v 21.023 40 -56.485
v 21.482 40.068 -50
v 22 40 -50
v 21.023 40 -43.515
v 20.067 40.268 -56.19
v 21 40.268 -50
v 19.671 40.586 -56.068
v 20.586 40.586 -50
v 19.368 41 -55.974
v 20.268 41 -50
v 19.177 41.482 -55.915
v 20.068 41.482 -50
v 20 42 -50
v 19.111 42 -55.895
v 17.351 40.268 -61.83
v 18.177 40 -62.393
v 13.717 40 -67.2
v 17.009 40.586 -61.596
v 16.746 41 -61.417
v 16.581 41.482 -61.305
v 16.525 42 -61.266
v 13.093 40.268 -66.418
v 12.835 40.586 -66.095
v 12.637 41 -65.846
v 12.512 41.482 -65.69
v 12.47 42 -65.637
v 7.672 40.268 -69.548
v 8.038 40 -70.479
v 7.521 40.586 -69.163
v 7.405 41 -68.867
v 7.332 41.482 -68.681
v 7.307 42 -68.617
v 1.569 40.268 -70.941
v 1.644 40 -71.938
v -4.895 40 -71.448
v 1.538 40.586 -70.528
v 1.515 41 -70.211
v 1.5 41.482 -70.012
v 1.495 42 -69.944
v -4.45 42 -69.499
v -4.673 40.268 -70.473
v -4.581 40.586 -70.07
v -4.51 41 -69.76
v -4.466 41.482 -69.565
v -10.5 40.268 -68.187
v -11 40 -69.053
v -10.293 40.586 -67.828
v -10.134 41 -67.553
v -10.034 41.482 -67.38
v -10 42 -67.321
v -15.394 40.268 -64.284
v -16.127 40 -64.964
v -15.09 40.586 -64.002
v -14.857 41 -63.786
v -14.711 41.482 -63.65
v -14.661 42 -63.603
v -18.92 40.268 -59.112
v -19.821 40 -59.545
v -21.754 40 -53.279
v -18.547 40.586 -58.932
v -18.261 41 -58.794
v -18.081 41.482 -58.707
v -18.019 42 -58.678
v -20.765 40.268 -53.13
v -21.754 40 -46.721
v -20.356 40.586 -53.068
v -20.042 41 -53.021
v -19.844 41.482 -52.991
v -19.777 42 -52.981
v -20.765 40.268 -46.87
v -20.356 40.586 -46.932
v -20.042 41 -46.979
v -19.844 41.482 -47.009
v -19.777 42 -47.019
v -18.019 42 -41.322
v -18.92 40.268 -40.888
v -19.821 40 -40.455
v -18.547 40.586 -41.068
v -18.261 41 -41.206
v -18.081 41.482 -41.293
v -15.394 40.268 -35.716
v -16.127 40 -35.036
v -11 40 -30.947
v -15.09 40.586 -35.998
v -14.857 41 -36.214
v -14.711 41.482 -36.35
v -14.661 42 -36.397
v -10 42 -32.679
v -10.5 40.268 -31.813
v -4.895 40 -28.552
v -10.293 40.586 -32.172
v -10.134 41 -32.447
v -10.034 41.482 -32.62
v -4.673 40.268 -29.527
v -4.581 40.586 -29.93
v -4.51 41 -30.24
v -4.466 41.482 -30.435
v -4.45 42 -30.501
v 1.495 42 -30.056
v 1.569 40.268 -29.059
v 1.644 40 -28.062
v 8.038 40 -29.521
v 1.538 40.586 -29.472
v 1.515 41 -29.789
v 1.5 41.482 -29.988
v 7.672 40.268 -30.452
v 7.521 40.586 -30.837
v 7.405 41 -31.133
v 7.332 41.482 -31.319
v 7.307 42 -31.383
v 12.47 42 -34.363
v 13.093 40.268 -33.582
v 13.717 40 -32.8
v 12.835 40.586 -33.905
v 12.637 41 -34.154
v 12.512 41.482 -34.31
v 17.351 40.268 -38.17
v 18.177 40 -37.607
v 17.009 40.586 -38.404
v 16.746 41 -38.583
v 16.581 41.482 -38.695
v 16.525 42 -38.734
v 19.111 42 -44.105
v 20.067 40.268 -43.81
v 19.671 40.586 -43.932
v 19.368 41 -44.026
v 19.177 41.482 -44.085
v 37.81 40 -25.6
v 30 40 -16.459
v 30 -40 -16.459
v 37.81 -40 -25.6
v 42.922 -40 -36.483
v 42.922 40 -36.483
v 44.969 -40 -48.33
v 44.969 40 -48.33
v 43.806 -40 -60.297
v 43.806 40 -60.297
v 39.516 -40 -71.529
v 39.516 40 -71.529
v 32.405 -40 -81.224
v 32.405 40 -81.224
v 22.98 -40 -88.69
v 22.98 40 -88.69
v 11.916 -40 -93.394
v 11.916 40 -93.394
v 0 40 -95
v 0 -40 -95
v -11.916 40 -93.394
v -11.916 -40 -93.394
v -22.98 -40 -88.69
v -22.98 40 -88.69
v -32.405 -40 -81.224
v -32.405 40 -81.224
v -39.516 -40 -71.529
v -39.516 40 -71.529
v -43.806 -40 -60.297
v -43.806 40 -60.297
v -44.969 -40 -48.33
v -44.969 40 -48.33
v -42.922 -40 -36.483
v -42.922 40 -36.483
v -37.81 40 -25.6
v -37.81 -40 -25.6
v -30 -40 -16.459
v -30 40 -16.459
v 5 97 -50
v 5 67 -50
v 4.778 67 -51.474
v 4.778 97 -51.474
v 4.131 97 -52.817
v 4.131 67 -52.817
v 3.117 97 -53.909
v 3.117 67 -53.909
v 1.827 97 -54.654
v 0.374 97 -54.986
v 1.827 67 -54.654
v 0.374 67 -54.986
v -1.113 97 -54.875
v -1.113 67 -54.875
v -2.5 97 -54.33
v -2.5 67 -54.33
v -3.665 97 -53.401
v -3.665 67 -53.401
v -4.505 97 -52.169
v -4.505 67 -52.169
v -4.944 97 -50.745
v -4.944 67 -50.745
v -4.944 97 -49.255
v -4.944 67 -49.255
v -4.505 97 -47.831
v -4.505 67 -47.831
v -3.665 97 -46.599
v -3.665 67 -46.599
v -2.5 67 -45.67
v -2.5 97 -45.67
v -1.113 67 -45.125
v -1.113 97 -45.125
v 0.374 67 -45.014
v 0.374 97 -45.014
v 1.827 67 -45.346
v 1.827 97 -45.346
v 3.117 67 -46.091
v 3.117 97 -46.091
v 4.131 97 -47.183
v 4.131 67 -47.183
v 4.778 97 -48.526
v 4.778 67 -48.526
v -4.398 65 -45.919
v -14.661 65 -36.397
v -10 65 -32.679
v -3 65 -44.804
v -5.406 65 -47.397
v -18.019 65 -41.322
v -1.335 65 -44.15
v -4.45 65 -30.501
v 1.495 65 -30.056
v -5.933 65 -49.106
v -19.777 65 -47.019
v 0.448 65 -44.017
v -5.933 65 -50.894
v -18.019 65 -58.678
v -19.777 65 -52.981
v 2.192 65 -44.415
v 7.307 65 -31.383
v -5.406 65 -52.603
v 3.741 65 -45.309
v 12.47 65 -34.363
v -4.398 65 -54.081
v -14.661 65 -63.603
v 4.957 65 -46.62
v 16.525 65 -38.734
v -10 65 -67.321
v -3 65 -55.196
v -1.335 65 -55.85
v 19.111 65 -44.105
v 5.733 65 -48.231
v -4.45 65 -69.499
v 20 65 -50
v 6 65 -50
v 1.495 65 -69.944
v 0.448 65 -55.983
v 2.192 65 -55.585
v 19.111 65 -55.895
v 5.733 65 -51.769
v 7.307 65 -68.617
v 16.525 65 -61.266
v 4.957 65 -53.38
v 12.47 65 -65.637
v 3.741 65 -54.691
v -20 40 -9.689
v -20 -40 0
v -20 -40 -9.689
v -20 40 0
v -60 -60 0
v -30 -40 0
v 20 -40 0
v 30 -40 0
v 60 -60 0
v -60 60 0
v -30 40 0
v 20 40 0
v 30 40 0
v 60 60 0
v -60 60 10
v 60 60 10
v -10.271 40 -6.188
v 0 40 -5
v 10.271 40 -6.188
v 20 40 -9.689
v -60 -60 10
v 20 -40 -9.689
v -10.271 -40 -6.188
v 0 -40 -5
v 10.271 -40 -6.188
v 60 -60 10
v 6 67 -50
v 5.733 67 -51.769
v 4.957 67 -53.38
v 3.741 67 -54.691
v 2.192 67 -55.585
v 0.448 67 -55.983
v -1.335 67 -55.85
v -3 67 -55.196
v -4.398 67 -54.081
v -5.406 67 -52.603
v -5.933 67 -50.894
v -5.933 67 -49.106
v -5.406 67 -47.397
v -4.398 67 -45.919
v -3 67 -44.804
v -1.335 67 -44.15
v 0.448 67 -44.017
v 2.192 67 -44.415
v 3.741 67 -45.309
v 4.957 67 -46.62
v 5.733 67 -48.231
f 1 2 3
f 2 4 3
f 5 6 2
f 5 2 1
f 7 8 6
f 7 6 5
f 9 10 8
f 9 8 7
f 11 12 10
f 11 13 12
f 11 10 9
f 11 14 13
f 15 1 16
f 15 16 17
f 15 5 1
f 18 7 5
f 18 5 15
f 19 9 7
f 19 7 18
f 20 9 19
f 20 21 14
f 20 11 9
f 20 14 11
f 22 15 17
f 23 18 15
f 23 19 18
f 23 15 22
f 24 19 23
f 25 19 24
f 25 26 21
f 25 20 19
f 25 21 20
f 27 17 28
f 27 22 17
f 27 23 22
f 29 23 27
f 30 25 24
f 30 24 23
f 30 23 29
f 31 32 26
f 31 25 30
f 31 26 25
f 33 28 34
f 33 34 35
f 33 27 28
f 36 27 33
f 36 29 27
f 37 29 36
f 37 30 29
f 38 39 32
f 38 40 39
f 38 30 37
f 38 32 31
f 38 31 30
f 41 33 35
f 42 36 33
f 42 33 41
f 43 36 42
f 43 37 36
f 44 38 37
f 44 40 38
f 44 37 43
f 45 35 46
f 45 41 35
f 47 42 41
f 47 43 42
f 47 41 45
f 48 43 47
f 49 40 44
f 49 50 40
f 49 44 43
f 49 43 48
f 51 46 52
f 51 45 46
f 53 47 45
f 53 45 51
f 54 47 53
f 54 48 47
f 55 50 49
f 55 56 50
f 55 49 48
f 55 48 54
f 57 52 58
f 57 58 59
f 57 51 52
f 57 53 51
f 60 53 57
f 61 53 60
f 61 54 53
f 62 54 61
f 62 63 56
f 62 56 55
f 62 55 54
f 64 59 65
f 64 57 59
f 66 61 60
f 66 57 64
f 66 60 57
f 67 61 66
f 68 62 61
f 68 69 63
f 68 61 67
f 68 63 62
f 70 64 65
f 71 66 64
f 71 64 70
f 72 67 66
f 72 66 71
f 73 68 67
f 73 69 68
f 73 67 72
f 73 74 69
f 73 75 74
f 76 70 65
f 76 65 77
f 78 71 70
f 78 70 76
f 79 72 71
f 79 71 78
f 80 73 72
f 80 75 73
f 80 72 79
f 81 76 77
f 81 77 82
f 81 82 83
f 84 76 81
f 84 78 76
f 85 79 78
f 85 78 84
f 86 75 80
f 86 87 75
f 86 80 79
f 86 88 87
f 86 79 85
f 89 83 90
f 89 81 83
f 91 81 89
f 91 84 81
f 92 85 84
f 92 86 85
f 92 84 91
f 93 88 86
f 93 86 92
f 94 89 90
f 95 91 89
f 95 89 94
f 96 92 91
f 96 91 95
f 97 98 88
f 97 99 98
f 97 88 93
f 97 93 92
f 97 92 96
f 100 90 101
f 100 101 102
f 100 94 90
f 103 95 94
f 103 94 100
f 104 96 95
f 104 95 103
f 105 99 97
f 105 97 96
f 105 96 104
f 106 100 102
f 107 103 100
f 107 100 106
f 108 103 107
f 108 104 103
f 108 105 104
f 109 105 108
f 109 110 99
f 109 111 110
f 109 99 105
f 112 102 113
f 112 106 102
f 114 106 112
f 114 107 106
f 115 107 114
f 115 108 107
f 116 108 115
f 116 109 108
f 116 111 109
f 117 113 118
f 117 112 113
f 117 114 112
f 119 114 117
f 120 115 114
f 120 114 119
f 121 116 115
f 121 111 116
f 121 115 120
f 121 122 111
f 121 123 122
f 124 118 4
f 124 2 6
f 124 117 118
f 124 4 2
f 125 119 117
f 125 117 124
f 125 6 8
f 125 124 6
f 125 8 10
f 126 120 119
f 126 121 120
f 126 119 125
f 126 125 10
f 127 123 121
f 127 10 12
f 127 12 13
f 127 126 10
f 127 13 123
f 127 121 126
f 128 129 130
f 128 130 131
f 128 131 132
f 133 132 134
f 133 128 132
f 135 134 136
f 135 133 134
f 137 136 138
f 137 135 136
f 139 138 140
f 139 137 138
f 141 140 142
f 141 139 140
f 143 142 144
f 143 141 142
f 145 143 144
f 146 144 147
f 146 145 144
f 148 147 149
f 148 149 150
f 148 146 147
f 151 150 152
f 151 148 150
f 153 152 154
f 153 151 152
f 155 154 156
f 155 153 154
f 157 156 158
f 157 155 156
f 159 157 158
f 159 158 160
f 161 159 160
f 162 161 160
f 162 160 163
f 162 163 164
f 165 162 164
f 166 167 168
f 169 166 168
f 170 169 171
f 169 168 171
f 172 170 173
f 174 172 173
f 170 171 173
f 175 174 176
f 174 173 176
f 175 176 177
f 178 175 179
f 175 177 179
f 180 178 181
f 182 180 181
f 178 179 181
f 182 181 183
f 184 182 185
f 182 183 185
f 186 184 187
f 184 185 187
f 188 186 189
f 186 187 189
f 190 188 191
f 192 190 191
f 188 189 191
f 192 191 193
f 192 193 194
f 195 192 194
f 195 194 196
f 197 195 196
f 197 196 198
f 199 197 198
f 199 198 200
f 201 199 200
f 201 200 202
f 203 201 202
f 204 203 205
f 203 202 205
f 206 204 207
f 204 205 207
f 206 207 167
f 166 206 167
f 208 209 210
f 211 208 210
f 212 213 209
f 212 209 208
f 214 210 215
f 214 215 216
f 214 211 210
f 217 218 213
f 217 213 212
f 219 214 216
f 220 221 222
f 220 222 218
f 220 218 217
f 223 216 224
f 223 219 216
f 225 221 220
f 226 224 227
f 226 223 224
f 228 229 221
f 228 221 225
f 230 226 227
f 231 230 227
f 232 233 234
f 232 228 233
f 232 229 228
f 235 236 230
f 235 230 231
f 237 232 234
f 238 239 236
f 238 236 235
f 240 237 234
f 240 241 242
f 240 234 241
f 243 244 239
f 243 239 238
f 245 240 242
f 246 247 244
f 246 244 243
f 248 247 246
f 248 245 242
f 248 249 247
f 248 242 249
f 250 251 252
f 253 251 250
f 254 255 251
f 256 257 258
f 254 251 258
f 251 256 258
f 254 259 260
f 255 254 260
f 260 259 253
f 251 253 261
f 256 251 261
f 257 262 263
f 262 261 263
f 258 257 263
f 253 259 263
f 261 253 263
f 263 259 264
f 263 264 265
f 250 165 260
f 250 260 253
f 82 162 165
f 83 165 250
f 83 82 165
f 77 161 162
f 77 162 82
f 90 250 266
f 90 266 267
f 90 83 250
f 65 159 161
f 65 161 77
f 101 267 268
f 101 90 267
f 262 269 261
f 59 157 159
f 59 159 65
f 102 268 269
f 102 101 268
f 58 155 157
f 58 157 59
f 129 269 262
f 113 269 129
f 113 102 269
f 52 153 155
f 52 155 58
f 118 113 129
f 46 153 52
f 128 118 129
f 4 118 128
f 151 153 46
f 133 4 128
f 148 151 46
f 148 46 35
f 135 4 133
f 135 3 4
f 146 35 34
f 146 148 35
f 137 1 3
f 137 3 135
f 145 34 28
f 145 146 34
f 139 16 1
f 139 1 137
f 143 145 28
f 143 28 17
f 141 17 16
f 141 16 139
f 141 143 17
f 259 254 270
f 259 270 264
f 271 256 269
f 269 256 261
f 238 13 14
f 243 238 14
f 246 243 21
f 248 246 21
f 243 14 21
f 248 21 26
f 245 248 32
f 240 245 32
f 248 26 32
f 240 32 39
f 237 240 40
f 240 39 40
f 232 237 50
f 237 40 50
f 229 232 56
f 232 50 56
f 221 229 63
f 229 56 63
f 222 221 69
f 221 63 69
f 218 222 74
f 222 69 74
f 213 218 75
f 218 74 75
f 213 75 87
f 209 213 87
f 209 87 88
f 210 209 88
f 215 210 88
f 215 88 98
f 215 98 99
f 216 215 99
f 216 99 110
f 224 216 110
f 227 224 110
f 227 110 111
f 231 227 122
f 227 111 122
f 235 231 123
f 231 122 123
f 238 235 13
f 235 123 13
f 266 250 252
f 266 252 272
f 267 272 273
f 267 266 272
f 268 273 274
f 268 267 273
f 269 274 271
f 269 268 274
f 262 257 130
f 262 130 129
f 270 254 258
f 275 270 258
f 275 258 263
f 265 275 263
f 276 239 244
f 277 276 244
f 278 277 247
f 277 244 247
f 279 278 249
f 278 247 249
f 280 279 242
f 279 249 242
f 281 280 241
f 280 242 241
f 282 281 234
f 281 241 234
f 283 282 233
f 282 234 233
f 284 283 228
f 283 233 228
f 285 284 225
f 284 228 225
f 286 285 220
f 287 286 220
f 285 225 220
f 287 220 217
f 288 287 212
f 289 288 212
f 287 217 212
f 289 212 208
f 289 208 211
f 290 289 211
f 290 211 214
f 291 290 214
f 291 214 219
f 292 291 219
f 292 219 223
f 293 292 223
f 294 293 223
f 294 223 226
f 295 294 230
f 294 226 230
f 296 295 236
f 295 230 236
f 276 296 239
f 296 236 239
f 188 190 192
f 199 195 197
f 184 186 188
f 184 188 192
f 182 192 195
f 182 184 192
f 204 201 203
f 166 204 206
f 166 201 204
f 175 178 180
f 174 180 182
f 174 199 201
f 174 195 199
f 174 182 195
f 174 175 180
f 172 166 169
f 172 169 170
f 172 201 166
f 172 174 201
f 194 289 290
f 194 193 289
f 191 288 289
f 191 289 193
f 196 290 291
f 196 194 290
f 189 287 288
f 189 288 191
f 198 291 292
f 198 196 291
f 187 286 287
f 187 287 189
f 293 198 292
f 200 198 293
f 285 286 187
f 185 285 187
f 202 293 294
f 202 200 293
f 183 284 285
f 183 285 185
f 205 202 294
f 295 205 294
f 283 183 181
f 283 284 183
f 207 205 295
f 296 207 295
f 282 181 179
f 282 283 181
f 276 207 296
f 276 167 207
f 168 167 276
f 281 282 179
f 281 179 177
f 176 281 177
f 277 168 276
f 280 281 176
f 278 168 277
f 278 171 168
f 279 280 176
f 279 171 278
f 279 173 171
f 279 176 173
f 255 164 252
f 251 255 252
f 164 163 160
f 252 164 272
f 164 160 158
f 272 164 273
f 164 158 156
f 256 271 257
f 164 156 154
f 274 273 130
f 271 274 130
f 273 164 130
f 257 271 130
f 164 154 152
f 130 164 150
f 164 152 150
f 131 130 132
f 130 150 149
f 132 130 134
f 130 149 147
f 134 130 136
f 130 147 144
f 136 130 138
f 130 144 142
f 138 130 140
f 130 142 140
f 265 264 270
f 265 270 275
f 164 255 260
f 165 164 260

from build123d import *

# Parameters (mm, degrees)
SKETCH1_W           = 120
SKETCH1_H           = 120
BOSS_EXTRUDE1_DEPTH = 10
SKETCH2_R           = 45
BOSS_EXTRUDE2_DEPTH = 40
SKETCH3_W           = 10
SKETCH3_H           = 80
BOSS_EXTRUDE3_DEPTH = 50
SKETCH4_R           = 20
BOSS_EXTRUDE4_DEPTH = 25
FILLET1_R           = 2
SKETCH6_R           = 6
BOSS_EXTRUDE5_DEPTH = 2
SKETCH7_R           = 5
BOSS_EXTRUDE6_DEPTH = 30


with BuildPart() as part:
    # Sketch1 → Boss-Extrude1 (new body)
    with BuildSketch(Plane.XY):
        Rectangle(SKETCH1_W, SKETCH1_H)
    extrude(amount=BOSS_EXTRUDE1_DEPTH)

    # Sketch3 → Boss-Extrude3 (add)
    with BuildSketch(Plane(origin=(0, 0, 0), x_dir=(-1, 0, 0), z_dir=(0, 0, -1))):
        with Locations((-25, 0)):
            Rectangle(SKETCH3_W, SKETCH3_H)
        with Locations((25, 0)):
            Rectangle(SKETCH3_W, SKETCH3_H)
    extrude(amount=BOSS_EXTRUDE3_DEPTH)



with BuildPart() as body_2:
    # Sketch2 → Boss-Extrude2 (new body, symmetric)
    with BuildSketch(Plane(origin=(0, 0, 0), x_dir=(1, 0, 0), z_dir=(0, 1, 0))):
        with Locations((0, 50)):
            Circle(SKETCH2_R)
    extrude(amount=BOSS_EXTRUDE2_DEPTH, both=True)


with BuildPart() as part_1:
    add(part.part)

    add(body_2.part)  # Boss-Extrude4 merges body 2
    # Sketch4 → Boss-Extrude4 (add)
    with BuildSketch(Plane(origin=(0, 40, 0), x_dir=(1, 0, 0), z_dir=(0, 1, 0))):
        with Locations((0, 50)):
            Circle(SKETCH4_R)
    extrude(amount=BOSS_EXTRUDE4_DEPTH)

    # Fillet1
    fillet1_edges = [part_1.edges().sort_by_distance(p)[0] for p in [
        (-20, 40, -50),
    ]]
    fillet(fillet1_edges, radius=FILLET1_R)

    # Sketch6 → Boss-Extrude5 (add)
    with BuildSketch(Plane(origin=(0, 65, 0), x_dir=(1, 0, 0), z_dir=(0, 1, 0))):
        with Locations((0, 50)):
            Circle(SKETCH6_R)
    extrude(amount=BOSS_EXTRUDE5_DEPTH)

    # Sketch7 → Boss-Extrude6 (add)
    with BuildSketch(Plane(origin=(0, 67, 0), x_dir=(1, 0, 0), z_dir=(0, 1, 0))):
        with Locations((0, 50)):
            Circle(SKETCH7_R)
    extrude(amount=BOSS_EXTRUDE6_DEPTH)


solid = part_1.part
